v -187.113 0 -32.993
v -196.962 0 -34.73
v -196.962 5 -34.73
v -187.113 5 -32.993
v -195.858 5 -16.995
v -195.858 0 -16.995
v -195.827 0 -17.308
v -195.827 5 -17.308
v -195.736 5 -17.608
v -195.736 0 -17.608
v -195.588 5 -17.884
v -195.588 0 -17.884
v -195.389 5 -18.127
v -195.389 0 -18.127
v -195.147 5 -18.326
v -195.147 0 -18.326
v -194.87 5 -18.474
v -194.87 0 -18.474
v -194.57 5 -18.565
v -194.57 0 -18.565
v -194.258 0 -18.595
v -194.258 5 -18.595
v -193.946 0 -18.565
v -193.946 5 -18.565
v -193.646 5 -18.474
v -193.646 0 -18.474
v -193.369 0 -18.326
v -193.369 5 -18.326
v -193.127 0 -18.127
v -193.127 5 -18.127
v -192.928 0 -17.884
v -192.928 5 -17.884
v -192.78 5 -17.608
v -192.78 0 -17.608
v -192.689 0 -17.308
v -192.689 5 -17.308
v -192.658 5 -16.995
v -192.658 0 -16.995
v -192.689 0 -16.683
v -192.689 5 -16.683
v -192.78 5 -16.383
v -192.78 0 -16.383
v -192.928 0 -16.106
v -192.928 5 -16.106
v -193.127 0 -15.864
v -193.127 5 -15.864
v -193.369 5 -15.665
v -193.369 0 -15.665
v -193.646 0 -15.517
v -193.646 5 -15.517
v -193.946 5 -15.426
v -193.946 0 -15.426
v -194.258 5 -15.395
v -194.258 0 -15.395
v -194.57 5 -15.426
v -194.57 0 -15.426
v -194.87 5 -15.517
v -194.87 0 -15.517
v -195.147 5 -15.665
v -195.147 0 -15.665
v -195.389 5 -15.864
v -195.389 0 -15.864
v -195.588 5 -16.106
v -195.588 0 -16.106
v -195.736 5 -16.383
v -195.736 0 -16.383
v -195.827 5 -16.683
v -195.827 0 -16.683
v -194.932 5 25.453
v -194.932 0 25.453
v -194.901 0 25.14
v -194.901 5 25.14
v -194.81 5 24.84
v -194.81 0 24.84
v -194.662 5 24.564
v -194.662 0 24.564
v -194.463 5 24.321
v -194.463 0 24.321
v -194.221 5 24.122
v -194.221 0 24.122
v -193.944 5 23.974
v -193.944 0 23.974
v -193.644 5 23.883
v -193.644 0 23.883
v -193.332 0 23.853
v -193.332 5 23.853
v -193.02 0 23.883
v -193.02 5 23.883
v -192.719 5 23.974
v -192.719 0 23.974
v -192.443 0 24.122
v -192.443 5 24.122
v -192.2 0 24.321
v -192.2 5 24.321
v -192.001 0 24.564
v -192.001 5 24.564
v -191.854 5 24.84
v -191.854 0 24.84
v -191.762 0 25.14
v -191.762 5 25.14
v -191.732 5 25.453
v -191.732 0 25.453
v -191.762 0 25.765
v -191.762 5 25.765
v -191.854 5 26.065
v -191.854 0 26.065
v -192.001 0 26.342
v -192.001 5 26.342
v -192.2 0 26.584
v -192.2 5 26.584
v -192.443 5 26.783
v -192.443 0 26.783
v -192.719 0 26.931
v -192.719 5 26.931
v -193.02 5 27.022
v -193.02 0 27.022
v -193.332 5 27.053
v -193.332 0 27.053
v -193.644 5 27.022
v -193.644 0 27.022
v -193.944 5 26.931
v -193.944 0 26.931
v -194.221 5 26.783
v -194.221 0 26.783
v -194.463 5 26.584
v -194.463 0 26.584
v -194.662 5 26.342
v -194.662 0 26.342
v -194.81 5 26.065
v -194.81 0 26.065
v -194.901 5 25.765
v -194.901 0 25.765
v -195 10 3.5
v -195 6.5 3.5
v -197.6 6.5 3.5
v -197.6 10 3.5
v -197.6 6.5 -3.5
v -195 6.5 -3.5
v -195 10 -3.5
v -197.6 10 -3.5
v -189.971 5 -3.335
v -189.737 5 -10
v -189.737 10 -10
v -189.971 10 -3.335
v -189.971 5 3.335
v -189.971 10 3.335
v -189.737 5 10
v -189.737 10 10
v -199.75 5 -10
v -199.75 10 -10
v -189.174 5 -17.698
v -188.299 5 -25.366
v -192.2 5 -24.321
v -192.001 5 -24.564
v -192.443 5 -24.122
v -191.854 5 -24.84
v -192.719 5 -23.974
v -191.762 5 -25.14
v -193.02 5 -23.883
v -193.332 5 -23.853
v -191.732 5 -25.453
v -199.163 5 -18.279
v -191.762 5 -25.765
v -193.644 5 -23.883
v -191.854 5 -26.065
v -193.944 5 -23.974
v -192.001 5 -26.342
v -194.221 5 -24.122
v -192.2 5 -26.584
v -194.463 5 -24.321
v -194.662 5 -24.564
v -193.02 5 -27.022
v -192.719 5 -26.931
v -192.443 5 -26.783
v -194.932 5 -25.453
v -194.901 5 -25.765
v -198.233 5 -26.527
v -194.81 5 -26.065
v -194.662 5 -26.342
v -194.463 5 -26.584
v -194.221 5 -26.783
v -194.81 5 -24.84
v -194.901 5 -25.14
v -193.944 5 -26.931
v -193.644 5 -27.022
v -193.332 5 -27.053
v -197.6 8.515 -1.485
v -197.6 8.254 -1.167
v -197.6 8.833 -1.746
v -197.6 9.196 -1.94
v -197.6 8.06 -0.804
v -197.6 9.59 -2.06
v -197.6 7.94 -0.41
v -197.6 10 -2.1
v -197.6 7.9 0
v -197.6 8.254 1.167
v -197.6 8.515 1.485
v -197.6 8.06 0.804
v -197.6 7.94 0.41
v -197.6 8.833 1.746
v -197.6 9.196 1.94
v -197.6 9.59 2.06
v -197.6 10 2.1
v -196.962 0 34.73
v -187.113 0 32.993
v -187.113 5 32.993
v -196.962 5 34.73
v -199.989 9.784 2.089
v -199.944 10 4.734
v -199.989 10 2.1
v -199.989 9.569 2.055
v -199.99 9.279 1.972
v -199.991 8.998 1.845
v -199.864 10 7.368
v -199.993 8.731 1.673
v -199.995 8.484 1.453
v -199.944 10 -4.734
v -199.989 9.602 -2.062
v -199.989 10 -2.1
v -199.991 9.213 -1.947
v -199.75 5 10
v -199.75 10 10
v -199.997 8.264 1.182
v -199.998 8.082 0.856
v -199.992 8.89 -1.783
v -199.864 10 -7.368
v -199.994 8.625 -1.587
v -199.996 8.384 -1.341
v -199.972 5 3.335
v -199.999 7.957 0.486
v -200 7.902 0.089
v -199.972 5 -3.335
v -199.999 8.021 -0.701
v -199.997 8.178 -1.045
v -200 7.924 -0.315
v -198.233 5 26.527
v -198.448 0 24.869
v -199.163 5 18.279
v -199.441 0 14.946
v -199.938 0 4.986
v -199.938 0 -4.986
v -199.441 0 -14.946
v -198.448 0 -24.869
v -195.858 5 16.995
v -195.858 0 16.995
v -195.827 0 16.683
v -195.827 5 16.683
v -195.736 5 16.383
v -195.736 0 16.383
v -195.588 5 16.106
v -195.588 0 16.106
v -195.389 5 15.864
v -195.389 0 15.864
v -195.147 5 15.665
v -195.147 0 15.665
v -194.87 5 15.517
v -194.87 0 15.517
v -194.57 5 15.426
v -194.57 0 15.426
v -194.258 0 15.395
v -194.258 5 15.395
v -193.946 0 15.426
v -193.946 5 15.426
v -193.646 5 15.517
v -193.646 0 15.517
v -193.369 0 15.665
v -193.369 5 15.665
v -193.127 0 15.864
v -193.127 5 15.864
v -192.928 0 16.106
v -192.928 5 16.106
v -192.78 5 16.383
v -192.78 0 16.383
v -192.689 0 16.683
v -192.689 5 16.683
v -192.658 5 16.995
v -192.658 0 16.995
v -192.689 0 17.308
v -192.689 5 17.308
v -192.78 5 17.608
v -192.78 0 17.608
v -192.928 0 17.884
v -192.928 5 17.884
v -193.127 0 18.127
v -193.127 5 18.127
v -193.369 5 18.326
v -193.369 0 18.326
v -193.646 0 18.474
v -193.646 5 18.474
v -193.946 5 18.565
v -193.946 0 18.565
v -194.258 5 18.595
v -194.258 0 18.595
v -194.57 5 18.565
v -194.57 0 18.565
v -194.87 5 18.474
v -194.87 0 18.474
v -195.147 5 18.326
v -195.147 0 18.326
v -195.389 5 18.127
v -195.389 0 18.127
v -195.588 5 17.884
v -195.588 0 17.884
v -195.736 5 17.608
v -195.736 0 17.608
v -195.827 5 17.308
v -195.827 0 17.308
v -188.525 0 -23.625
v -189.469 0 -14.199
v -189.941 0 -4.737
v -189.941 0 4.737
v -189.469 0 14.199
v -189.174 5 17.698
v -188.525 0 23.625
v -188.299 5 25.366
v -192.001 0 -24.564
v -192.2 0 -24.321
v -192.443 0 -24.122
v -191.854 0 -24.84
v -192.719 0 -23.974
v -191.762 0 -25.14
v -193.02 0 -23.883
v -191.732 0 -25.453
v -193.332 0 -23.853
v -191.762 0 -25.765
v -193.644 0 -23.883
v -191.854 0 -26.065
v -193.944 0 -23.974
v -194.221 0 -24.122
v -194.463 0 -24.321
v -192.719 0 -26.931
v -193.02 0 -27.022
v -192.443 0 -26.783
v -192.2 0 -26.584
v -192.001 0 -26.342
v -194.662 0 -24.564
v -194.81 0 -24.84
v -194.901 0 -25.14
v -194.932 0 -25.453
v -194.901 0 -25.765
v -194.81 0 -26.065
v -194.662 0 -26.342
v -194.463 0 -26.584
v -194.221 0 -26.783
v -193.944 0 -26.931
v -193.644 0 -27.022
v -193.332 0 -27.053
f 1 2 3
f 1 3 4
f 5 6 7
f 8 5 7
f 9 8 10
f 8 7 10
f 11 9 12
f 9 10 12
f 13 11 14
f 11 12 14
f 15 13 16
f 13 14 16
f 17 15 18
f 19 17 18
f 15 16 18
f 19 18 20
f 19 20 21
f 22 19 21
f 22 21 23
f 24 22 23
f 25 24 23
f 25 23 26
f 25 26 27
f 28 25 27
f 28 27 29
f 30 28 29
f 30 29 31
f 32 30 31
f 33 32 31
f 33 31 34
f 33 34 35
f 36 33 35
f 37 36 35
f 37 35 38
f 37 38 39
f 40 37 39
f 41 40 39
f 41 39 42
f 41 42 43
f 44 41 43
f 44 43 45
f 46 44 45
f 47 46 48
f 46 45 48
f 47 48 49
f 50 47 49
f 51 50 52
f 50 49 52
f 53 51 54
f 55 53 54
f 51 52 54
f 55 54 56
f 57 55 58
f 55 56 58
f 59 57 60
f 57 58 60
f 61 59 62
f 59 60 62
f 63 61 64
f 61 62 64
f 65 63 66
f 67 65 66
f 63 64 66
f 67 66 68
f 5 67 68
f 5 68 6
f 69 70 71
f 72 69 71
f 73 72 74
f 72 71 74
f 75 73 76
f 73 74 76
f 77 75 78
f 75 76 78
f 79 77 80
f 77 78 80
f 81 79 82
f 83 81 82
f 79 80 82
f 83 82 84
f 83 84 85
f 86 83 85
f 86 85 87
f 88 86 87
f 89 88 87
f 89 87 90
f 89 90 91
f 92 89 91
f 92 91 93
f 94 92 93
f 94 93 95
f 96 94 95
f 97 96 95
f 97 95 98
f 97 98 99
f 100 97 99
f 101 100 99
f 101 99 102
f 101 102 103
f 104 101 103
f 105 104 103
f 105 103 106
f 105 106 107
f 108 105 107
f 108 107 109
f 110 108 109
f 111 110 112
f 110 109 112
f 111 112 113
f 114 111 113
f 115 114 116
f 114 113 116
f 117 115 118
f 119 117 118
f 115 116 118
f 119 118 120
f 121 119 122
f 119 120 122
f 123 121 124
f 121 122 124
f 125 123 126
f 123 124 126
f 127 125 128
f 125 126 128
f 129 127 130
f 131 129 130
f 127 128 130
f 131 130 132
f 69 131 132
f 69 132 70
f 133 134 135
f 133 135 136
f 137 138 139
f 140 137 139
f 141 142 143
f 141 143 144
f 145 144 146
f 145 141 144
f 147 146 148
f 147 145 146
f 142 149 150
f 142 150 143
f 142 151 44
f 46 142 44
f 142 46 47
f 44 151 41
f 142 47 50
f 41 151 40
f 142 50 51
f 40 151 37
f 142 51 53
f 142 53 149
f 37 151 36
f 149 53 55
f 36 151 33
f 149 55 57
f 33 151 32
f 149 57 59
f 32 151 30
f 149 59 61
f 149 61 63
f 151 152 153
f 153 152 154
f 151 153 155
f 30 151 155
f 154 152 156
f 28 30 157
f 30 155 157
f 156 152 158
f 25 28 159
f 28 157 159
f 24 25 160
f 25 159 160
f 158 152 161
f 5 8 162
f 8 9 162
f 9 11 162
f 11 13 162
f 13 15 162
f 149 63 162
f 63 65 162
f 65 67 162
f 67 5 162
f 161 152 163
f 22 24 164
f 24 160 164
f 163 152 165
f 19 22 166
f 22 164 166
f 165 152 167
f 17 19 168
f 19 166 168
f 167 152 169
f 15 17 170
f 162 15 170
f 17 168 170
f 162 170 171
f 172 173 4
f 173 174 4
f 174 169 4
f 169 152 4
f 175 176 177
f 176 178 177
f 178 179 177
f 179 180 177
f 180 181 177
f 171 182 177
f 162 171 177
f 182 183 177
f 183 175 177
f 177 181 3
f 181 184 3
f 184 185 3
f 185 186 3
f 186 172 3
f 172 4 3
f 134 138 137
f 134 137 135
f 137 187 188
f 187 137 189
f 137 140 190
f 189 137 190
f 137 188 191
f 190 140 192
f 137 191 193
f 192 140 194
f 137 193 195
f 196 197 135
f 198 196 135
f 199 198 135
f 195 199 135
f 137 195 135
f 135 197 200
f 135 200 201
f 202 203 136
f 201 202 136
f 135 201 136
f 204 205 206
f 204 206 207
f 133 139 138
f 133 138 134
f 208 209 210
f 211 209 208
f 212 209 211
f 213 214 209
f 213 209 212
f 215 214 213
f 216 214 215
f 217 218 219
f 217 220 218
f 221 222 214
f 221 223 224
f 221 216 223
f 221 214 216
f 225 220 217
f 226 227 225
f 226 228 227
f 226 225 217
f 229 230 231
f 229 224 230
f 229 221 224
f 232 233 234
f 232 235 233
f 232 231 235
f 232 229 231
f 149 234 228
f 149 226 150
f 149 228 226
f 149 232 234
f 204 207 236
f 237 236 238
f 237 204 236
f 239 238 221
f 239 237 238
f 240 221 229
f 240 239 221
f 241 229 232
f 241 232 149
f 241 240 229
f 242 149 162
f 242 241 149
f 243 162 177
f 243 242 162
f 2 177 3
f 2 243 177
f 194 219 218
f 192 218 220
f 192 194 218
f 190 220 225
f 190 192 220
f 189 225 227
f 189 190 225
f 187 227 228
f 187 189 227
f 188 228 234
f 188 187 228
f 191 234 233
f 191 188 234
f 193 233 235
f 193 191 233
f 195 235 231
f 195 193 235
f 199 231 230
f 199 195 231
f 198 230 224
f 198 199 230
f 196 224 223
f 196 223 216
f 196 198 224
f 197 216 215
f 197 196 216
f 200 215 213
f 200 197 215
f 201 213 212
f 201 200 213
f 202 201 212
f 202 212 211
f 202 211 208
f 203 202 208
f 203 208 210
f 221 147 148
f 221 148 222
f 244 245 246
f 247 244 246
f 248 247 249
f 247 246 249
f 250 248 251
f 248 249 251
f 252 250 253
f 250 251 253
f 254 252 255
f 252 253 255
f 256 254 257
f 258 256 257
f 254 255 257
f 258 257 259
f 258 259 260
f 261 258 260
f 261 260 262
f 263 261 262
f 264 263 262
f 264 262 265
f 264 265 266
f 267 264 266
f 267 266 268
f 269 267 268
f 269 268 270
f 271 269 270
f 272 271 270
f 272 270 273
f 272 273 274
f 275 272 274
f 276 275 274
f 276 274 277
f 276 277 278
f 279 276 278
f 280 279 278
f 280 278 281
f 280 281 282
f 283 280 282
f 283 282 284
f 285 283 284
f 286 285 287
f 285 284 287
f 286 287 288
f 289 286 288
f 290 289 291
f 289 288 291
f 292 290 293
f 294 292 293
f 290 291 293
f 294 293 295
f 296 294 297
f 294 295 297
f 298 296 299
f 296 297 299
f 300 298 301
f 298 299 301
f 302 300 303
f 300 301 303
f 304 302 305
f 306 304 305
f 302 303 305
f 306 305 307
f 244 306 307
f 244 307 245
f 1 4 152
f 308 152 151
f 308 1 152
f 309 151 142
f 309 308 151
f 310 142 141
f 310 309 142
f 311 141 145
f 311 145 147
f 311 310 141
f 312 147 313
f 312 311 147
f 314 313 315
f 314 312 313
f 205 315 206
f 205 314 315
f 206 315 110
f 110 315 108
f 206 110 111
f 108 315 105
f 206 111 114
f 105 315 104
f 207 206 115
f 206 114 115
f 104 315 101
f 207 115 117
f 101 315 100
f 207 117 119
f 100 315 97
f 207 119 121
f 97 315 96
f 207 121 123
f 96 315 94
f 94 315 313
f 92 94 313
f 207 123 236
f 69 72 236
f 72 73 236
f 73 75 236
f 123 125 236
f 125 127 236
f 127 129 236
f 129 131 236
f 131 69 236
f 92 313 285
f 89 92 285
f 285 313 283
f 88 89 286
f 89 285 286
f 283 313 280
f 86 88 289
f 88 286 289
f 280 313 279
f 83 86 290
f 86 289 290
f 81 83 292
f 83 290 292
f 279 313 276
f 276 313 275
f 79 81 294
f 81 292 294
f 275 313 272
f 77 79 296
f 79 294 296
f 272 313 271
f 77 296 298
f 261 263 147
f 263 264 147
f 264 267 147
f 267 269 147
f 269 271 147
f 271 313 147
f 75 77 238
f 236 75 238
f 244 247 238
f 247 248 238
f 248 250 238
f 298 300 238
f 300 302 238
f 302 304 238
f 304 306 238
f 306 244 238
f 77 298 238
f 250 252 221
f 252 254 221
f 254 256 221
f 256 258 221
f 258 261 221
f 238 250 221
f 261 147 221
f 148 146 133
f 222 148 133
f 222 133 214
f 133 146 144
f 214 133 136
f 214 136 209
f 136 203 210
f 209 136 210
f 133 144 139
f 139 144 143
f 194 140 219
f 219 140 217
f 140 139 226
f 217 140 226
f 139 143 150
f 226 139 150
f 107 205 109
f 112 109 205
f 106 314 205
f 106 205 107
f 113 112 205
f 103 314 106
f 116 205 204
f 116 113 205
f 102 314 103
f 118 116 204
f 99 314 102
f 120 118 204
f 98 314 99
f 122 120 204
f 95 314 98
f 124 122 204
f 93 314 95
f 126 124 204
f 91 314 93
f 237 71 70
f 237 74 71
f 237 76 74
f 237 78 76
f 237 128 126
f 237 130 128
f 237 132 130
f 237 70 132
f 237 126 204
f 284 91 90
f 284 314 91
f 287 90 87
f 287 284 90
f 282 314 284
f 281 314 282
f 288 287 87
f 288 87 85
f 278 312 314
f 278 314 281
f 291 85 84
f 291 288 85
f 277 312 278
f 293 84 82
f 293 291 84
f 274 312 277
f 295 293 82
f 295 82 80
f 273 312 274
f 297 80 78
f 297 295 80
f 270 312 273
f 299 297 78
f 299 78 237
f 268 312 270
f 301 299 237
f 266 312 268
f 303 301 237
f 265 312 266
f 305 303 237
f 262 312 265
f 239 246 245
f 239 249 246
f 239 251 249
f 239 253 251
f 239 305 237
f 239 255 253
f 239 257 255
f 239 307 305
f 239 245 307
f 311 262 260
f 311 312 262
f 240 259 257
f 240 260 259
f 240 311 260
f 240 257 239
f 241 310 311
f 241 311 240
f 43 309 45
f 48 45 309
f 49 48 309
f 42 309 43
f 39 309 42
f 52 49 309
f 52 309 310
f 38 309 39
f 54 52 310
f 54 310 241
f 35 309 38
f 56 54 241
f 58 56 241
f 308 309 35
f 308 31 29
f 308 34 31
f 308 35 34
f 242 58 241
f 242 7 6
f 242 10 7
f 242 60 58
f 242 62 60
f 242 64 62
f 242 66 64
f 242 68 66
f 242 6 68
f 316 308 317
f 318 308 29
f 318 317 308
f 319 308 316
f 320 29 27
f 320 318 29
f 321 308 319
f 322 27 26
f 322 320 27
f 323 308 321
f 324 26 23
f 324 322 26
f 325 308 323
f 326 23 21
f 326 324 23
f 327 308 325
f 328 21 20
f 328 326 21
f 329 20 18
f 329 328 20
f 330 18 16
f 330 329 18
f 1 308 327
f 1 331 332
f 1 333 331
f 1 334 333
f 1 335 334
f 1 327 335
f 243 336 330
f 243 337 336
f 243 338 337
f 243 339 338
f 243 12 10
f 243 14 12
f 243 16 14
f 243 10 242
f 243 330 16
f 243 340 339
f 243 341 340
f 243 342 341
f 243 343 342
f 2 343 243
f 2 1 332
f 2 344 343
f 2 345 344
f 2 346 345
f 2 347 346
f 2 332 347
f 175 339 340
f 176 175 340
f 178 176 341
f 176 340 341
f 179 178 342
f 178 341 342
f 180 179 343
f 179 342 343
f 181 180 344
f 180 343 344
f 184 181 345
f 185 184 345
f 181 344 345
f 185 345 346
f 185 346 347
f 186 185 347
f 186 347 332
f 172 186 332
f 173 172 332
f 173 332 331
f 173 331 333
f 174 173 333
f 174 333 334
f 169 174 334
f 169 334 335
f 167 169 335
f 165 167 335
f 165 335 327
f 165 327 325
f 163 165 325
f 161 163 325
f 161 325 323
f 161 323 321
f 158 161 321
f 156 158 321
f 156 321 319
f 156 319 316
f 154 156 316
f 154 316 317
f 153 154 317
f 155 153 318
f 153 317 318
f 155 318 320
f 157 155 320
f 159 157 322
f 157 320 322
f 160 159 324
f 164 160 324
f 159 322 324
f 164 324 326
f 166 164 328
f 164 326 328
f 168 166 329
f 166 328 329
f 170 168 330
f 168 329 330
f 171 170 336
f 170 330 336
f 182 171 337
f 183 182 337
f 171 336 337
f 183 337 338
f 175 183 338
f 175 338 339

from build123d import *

# Parameters (mm, degrees)
BOSS_EXTRUDE1_DEPTH        = 5
BOSS_EXTRUDE2_DEPTH        = 5
SKETCH10_W                 = 7
SKETCH10_H                 = 7
CUT_EXTRUDE2_DEPTH         = 2.6
SKETCH11_R                 = 2.1
CUT_EXTRUDE3_DEPTH         = 37.99114612
F_3_2_3_2_DIAMETER_HOLE1_D = 3.2


with BuildPart() as part:
    # Sketch1 → Boss-Extrude1 (new body)
    with BuildSketch(Plane(origin=(0, 0, 0), x_dir=(1, 0, 0), z_dir=(0, 1, 0))):
        with BuildLine():
            Line((-196.961550602, 34.729635533), (-187.113473072, 32.993153757))
            ThreePointArc((-187.113473072, 32.993153757), (-190, 0), (-187.113473072, -32.993153757))
            Line((-187.113473072, -32.993153757), (-196.961550602, -34.729635533))
            ThreePointArc((-196.961550602, -34.729635533), (-200, 0), (-196.961550602, 34.729635533))
        make_face()
    extrude(amount=BOSS_EXTRUDE1_DEPTH)

    # Sketch9 → Boss-Extrude2 (add)
    with BuildSketch(Plane(origin=(0, 5, 0), x_dir=(1, 0, 0), z_dir=(0, 1, 0))):
        with BuildLine():
            Line((-199.749843554, 10), (-189.73665961, 10))
            ThreePointArc((-189.73665961, 10), (-190, 0), (-189.73665961, -10))
            Line((-189.73665961, -10), (-199.749843554, -10))
            ThreePointArc((-199.749843554, -10), (-200, 0), (-199.749843554, 10))
        make_face()
    extrude(amount=BOSS_EXTRUDE2_DEPTH)

    # Sketch10 → Cut-Extrude2 (cut)
    with BuildSketch(Plane.ZY.offset(195)):
        with Locations((0, 10)):
            Rectangle(SKETCH10_W, SKETCH10_H)
    extrude(amount=CUT_EXTRUDE2_DEPTH, mode=Mode.SUBTRACT)

    # Sketch11 → Cut-Extrude3 (cut, through all)
    with BuildSketch(Plane.ZY.offset(195)):
        with Locations((0, 10)):
            Circle(SKETCH11_R)
    extrude(amount=CUT_EXTRUDE3_DEPTH, mode=Mode.SUBTRACT)

    # Ø3.2 (3.2) Diameter Hole1 (through all)
    with Locations(Plane(origin=(0, 5, 0), x_dir=(1, 0, 0), z_dir=(0, 1, 0))):
        with Locations((-194.257966128, 16.995369836), (-193.331747968, 25.452607483), (-194.257966128, -16.995369836), (-193.331747968, -25.452607483)):
            Hole(F_3_2_3_2_DIAMETER_HOLE1_D / 2)


solid = part.part
